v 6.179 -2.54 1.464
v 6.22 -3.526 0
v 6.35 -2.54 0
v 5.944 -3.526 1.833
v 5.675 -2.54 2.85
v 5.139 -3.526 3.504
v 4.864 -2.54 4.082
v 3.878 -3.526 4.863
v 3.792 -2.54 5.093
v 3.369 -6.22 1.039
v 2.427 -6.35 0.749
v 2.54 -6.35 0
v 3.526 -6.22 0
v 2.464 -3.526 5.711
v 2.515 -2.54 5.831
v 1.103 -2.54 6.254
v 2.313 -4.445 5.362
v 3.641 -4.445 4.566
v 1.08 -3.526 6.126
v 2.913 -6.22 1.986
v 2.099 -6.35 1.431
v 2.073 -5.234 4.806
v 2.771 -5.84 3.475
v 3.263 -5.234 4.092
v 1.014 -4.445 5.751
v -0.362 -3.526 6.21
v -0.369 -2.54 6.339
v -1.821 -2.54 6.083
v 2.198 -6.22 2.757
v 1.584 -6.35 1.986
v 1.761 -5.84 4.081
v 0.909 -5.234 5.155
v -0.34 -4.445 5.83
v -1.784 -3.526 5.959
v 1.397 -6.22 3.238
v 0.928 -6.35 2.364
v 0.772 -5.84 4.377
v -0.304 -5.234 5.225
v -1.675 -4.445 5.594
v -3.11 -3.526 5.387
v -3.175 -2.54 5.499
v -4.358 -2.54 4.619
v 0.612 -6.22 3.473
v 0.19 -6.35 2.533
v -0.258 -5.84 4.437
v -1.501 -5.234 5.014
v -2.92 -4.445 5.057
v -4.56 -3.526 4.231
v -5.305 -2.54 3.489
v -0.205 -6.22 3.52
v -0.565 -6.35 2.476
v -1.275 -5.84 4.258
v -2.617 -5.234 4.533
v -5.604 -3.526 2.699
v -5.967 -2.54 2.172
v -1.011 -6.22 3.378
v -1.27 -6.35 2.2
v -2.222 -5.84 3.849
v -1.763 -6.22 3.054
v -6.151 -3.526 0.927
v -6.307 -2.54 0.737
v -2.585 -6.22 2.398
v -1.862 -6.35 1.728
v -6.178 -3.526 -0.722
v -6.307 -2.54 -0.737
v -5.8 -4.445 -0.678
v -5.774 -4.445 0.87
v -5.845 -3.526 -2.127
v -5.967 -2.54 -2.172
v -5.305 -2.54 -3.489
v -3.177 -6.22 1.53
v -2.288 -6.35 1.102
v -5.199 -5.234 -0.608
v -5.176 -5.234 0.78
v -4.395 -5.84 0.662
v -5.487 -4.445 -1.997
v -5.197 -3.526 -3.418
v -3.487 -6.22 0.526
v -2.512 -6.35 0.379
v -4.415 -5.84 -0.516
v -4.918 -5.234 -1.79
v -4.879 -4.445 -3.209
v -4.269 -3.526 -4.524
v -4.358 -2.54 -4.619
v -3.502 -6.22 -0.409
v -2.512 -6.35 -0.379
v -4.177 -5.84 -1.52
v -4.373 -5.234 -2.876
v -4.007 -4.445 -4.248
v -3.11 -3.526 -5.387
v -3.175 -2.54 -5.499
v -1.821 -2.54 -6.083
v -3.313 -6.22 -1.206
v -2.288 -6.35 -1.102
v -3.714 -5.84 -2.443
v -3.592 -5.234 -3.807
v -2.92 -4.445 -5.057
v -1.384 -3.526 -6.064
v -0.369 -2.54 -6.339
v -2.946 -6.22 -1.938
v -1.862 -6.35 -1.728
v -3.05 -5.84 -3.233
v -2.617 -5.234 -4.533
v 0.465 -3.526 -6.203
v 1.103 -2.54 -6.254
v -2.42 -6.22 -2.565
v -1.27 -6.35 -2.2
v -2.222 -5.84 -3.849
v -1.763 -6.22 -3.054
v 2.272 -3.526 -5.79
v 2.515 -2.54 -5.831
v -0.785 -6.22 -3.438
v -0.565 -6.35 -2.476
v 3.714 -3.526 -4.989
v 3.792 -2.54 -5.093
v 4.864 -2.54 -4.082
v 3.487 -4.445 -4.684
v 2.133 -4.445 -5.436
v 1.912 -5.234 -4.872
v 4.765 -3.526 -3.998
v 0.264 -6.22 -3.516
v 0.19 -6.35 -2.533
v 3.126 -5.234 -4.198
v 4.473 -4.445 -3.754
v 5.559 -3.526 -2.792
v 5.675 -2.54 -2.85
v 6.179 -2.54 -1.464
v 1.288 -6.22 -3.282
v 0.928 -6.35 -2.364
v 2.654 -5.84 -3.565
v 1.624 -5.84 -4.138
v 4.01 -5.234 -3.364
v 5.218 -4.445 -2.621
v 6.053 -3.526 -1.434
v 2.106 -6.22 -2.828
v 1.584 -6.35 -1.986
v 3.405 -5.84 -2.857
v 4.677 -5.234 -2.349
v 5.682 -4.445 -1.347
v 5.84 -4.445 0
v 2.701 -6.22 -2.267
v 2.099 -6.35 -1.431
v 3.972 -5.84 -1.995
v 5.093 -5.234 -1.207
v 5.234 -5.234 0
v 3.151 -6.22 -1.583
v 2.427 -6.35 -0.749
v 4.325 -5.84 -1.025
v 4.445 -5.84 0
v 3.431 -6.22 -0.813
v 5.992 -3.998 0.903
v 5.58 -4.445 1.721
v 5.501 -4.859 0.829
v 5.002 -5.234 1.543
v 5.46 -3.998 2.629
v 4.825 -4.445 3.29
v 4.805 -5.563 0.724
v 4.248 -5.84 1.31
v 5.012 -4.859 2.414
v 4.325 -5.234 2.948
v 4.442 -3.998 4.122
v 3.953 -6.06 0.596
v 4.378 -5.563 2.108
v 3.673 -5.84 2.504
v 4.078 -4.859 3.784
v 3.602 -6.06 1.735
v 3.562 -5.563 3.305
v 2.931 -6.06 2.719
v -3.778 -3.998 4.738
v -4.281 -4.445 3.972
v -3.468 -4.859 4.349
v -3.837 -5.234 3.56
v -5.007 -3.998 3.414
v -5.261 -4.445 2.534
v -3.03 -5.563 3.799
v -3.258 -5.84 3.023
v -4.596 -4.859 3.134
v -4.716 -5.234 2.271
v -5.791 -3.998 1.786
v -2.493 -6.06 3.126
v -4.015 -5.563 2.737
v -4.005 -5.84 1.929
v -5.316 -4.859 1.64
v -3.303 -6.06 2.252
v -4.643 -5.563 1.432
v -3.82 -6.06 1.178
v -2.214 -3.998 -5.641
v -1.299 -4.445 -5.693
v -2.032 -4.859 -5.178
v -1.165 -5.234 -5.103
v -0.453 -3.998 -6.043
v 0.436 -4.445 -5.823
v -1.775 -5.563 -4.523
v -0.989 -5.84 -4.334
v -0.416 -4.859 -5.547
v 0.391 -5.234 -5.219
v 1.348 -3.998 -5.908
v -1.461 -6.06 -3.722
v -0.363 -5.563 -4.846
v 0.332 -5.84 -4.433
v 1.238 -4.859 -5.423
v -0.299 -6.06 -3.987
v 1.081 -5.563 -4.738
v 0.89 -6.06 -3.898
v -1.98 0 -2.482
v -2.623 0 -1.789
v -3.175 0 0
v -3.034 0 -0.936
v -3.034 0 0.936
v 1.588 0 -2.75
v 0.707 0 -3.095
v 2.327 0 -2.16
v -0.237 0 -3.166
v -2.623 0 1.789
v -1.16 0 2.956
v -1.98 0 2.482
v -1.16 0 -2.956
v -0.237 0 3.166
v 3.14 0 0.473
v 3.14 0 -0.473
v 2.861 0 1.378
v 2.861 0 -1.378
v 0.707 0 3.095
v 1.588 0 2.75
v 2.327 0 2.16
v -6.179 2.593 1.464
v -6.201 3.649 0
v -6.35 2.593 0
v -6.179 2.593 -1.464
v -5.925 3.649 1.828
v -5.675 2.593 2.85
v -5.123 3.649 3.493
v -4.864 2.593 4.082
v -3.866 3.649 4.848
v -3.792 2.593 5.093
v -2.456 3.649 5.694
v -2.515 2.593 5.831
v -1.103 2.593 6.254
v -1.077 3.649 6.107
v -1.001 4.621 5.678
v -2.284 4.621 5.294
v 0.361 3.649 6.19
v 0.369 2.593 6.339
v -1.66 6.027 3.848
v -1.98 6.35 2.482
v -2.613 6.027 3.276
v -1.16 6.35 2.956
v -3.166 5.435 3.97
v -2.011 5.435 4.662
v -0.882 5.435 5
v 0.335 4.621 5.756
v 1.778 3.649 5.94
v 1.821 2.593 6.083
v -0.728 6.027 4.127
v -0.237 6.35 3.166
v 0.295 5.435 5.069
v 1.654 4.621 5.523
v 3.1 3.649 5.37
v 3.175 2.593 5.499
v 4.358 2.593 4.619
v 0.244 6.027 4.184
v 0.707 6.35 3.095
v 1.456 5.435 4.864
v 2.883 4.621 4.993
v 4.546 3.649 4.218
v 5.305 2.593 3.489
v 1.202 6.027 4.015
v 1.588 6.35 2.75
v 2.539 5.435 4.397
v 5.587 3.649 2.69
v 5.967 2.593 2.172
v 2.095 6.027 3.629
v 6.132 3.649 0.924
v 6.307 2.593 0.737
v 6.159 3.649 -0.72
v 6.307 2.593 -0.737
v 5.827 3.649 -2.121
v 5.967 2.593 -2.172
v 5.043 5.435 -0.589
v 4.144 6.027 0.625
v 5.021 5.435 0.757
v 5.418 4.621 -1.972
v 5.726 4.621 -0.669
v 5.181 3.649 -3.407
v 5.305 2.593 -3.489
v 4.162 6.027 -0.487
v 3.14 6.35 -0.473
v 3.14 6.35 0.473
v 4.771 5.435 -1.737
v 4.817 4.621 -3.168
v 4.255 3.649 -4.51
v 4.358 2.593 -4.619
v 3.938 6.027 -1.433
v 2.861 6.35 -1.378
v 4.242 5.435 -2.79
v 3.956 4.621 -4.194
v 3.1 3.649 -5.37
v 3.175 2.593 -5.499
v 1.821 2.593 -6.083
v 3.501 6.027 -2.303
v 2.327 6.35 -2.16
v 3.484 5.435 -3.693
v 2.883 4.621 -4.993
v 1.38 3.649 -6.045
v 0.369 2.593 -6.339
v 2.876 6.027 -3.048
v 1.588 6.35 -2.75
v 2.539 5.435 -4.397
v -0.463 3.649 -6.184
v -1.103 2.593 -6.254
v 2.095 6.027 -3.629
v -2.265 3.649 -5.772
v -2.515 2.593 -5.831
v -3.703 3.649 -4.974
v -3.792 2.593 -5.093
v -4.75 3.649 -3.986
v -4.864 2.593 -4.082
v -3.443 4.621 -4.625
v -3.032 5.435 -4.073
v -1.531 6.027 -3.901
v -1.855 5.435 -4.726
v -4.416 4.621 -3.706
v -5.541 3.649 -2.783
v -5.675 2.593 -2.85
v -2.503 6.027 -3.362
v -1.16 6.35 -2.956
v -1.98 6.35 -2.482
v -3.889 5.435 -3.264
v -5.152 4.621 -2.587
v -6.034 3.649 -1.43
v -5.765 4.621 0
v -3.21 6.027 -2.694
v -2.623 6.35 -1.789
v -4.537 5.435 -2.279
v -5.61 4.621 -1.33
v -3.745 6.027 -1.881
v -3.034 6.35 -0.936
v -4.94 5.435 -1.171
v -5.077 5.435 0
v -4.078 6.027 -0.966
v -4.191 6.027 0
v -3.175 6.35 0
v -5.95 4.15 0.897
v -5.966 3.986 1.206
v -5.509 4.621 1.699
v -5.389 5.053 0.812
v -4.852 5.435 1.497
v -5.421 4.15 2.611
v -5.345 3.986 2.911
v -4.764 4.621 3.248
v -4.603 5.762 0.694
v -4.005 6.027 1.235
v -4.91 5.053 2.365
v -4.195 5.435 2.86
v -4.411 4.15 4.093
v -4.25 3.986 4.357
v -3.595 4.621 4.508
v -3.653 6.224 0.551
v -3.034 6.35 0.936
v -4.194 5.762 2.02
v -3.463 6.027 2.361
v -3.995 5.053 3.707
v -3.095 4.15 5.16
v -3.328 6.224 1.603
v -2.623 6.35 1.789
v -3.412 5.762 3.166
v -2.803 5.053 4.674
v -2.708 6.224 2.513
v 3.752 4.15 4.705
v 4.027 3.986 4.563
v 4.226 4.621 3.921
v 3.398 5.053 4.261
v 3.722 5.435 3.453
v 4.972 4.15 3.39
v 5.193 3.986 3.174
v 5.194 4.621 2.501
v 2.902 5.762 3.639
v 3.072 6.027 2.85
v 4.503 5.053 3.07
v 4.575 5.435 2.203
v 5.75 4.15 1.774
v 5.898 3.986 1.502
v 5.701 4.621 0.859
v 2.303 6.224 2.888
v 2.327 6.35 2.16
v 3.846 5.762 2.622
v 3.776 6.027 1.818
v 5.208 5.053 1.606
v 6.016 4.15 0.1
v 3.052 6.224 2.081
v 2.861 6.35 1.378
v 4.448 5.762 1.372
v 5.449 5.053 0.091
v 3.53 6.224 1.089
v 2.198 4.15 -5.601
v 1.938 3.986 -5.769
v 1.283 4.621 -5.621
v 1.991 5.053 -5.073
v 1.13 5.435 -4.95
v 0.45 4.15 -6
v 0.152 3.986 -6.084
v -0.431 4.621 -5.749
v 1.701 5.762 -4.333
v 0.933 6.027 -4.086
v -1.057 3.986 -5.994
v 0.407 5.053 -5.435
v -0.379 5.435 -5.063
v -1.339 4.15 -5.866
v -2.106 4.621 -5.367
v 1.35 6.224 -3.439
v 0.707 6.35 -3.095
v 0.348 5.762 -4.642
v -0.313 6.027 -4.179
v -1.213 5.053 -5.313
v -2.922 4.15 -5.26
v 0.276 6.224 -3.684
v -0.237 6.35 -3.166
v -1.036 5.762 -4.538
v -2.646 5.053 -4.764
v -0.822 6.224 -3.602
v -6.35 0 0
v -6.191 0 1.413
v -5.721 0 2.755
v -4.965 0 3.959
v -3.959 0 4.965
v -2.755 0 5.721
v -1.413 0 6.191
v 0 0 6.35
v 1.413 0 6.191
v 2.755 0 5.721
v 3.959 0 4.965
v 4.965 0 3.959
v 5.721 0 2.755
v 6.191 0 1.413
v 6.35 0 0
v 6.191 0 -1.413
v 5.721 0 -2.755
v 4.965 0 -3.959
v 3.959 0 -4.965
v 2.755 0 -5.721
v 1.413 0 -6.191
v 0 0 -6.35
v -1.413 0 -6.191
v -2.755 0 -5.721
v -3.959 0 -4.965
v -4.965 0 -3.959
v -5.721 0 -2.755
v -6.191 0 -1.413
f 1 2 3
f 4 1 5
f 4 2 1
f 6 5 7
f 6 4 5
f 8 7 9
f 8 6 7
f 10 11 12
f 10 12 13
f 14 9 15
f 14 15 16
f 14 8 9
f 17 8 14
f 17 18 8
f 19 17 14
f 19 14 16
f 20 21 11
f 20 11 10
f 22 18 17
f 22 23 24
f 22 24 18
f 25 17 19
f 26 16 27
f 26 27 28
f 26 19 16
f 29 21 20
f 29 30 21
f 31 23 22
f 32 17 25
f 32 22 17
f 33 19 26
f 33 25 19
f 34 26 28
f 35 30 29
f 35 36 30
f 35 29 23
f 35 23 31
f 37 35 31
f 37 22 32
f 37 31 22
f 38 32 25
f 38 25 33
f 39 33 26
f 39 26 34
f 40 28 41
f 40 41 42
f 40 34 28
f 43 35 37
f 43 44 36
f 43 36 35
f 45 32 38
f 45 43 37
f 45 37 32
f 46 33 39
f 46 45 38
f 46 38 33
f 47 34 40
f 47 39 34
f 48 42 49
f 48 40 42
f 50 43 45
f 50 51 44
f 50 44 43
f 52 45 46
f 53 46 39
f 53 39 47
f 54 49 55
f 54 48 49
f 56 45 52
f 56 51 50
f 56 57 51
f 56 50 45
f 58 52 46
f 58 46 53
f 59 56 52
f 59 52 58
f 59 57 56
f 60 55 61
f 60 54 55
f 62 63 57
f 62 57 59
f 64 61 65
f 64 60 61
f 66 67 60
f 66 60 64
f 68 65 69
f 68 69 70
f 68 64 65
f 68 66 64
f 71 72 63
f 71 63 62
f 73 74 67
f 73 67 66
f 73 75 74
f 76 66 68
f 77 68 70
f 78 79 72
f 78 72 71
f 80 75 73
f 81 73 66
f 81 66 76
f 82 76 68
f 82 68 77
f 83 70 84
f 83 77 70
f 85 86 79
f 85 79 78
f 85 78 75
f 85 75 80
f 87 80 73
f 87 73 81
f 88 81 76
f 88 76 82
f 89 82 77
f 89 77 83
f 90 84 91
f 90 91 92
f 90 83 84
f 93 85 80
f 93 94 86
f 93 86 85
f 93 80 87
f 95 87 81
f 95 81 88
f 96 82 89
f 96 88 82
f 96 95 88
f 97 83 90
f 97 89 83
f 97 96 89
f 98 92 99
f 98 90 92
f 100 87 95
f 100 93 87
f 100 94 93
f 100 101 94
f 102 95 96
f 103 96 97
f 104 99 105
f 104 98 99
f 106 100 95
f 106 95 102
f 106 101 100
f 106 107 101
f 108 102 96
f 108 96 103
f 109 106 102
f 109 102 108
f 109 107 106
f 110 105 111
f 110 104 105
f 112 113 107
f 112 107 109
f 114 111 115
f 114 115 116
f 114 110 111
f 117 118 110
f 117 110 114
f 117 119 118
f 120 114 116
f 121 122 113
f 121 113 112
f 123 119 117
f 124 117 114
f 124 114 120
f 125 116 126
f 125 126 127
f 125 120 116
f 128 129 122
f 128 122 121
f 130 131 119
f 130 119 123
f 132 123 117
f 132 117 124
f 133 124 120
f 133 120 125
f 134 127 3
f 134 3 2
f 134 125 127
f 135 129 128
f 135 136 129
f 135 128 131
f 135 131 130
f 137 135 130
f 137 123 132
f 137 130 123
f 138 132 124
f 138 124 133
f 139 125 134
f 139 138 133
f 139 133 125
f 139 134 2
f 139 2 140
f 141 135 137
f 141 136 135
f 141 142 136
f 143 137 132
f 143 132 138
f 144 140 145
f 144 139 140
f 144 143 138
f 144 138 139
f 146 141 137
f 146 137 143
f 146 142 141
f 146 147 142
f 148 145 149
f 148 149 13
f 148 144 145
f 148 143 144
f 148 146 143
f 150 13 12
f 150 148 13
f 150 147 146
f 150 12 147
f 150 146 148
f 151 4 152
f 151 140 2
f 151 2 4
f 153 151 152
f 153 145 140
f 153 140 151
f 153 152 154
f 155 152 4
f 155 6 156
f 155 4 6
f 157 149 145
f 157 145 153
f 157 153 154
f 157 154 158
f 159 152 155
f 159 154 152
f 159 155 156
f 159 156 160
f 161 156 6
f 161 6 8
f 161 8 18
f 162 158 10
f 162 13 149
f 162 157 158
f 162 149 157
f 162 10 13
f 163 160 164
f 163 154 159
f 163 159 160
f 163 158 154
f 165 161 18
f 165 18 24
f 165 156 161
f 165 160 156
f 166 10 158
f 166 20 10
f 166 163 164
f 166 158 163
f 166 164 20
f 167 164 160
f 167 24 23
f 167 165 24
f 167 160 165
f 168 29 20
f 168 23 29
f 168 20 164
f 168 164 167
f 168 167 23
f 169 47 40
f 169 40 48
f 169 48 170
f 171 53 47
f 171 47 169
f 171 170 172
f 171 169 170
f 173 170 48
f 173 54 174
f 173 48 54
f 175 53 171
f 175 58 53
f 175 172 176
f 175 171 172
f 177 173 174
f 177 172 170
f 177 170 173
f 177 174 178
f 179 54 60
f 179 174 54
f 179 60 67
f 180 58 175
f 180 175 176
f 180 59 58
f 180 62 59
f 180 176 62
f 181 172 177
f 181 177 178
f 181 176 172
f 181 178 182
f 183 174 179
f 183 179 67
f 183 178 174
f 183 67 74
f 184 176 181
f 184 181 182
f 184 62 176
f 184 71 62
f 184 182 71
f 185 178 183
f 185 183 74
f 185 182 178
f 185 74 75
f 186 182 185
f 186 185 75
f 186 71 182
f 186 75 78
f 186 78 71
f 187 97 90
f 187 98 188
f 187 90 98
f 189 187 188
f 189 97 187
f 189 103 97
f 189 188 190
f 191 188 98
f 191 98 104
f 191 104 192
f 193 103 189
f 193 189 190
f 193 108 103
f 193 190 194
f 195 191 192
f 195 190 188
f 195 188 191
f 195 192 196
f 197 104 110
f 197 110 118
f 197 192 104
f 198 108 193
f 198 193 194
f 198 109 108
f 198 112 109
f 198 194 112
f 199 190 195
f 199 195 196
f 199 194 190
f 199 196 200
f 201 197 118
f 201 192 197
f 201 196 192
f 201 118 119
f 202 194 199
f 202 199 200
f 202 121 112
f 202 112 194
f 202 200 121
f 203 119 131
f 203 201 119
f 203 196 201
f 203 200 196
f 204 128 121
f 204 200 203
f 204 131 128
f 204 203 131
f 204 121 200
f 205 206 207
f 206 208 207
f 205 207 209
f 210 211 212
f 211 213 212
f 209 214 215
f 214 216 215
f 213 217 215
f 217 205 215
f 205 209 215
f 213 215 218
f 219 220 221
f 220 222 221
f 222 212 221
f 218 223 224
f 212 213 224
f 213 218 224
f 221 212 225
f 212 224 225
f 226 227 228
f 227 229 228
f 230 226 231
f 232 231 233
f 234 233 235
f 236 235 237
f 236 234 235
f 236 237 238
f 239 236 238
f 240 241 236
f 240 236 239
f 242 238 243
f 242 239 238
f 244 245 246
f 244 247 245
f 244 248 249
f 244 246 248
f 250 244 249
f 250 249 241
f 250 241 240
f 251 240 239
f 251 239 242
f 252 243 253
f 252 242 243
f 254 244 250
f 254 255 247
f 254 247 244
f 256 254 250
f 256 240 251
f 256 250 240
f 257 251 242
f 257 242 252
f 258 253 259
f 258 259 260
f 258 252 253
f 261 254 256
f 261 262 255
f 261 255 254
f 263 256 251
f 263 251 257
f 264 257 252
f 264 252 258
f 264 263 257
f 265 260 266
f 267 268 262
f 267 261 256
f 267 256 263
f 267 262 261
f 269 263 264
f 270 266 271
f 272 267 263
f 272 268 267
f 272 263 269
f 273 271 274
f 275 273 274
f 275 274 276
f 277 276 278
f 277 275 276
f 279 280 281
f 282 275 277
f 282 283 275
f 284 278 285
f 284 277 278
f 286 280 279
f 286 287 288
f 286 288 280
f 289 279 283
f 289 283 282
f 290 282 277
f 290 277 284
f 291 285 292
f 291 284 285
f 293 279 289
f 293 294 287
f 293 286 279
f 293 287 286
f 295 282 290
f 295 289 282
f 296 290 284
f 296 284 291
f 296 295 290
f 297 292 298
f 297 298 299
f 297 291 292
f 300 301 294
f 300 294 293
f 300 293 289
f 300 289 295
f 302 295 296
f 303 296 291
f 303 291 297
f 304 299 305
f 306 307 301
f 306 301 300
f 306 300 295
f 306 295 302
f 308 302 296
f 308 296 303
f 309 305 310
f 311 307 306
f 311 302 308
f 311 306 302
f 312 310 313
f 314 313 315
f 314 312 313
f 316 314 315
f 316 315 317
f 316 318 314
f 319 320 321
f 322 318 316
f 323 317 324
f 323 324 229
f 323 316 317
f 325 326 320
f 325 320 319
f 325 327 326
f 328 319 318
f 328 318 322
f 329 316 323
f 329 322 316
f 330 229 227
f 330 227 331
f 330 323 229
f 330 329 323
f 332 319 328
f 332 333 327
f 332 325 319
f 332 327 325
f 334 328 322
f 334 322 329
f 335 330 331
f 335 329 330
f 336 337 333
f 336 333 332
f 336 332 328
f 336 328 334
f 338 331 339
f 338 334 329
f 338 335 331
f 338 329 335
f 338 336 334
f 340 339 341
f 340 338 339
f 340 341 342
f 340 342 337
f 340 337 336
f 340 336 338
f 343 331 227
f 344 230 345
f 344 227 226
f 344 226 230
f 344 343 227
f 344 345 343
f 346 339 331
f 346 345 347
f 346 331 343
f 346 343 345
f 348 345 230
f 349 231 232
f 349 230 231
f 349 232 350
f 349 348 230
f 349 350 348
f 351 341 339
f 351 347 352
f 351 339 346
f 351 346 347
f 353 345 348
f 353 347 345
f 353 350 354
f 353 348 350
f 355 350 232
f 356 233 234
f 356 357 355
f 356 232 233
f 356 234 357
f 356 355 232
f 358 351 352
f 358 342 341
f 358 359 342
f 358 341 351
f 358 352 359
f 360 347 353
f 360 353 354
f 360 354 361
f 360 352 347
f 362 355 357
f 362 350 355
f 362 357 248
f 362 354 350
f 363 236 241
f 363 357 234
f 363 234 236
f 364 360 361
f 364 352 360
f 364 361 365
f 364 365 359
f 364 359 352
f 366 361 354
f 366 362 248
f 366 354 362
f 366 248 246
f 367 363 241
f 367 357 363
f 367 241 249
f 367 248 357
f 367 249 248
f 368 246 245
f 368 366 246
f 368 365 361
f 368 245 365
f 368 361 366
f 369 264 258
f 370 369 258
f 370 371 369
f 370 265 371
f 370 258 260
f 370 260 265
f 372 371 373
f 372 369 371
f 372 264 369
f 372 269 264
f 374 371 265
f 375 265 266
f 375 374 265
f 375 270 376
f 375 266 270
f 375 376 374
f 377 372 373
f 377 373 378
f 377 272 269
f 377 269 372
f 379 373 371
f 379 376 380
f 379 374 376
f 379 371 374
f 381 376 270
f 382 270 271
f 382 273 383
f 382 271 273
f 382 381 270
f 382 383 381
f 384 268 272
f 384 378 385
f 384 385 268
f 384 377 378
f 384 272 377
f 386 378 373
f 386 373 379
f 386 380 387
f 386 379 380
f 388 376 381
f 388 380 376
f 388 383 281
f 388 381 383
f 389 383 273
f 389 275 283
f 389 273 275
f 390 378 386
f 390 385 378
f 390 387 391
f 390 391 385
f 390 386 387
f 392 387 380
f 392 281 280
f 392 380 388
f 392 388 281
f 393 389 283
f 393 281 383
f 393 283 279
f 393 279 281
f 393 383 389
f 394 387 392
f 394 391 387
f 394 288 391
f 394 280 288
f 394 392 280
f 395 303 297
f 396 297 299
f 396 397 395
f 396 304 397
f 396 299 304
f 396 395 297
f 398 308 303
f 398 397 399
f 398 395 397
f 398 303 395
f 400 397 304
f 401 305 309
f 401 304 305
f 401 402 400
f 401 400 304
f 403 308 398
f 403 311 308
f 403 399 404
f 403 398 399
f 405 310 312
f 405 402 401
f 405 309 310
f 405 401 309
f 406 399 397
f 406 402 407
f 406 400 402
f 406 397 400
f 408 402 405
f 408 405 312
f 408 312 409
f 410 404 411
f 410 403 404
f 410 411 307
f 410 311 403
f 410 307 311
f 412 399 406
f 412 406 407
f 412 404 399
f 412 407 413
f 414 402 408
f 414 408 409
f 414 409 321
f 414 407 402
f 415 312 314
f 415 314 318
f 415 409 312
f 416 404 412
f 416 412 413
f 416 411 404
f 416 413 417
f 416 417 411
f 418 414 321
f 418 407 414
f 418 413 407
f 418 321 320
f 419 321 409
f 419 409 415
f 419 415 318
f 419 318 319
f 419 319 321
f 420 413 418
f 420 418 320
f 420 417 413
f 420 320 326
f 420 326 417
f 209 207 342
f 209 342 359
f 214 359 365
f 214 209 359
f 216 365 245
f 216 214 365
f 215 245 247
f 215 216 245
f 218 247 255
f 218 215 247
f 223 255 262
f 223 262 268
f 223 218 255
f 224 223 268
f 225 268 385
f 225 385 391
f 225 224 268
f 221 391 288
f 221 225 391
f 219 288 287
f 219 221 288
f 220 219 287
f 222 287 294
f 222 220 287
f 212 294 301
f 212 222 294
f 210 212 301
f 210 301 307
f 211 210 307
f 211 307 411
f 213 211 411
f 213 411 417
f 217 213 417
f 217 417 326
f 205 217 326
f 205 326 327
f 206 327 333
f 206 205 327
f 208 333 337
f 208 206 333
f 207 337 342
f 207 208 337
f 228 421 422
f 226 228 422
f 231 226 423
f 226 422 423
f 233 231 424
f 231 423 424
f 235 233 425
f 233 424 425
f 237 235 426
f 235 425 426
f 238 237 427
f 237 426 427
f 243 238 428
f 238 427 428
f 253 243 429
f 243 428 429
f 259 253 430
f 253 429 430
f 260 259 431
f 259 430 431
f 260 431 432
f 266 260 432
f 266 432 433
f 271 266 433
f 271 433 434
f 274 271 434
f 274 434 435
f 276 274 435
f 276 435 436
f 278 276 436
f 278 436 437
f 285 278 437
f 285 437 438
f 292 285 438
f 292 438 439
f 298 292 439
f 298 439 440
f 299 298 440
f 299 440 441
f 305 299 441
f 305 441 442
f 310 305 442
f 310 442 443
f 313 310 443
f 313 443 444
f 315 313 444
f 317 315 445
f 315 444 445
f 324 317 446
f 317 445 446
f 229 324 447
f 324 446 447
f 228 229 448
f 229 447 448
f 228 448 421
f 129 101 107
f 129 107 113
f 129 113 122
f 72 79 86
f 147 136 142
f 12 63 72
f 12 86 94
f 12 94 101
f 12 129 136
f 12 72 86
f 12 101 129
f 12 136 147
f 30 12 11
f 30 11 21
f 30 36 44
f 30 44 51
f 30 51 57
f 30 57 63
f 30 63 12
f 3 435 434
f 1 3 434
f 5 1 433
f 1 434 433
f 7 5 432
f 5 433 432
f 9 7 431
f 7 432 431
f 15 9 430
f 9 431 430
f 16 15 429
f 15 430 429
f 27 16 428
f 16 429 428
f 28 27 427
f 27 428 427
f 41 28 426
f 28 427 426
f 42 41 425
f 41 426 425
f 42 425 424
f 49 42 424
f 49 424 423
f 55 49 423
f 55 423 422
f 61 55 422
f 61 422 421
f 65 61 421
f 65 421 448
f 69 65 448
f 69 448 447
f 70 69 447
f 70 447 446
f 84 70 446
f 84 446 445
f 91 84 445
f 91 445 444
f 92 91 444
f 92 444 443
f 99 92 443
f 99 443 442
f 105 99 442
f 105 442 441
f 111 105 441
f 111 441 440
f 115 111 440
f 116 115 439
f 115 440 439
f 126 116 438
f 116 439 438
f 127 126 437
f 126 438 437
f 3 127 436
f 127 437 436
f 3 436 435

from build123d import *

# Parameters (mm, degrees)
F0_R     = 6.35
F1_DEPTH = 6.35
F2_R     = 6.35
F2_R_2   = 3.175
F3_DEPTH = 6.35


# Not quite as in the source:
# - a fillet or chamfer that OpenCascade refuses, or shapes differently, is made with other operations: its cross-section is extruded or revolved along the edge and cut away or added


with BuildPart() as f1:
    # F0 (on Front) → F1 (new body)
    with BuildSketch(Plane.XZ):
        Circle(F0_R)
    extrude(amount=F1_DEPTH)

    # F2 (on face) → F3 (join)
    with BuildSketch(Plane(origin=(0, 0, 0), x_dir=(-1, 0, 0), z_dir=(0, 1, 0))):
        Circle(F2_R)
        Circle(F2_R_2, mode=Mode.SUBTRACT)
    extrude(amount=F3_DEPTH)

    # F4: fillet of radius 3.81 on 2 edges, made by hand

    # F4_s1 → F4_t2 (revolve, cut)
    with BuildSketch(Plane.XY):
        with BuildLine():
            ThreePointArc((-6.35, 2.5932893377), (-5.4499355663, 5.0526337626), (-3.175, 6.35))
            Line((-3.175, 6.35), (-6.35, 6.35))
            Line((-6.35, 6.35), (-6.35, 2.5932893377))
        make_face()
    revolve(axis=Axis((0, 6.35, 0), (0, 1, 0)), mode=Mode.SUBTRACT)

    # F4_s3 → F4_t4 (revolve, cut)
    with BuildSketch(Plane.XY):
        with BuildLine():
            ThreePointArc((6.35, -2.54), (5.2340768363, -5.2340768363), (2.54, -6.35))
            Line((2.54, -6.35), (6.35, -6.35))
            Line((6.35, -6.35), (6.35, -2.54))
        make_face()
    revolve(axis=Axis((0, -6.35, 0), (0, -1, 0)), mode=Mode.SUBTRACT)


solid = f1.part
